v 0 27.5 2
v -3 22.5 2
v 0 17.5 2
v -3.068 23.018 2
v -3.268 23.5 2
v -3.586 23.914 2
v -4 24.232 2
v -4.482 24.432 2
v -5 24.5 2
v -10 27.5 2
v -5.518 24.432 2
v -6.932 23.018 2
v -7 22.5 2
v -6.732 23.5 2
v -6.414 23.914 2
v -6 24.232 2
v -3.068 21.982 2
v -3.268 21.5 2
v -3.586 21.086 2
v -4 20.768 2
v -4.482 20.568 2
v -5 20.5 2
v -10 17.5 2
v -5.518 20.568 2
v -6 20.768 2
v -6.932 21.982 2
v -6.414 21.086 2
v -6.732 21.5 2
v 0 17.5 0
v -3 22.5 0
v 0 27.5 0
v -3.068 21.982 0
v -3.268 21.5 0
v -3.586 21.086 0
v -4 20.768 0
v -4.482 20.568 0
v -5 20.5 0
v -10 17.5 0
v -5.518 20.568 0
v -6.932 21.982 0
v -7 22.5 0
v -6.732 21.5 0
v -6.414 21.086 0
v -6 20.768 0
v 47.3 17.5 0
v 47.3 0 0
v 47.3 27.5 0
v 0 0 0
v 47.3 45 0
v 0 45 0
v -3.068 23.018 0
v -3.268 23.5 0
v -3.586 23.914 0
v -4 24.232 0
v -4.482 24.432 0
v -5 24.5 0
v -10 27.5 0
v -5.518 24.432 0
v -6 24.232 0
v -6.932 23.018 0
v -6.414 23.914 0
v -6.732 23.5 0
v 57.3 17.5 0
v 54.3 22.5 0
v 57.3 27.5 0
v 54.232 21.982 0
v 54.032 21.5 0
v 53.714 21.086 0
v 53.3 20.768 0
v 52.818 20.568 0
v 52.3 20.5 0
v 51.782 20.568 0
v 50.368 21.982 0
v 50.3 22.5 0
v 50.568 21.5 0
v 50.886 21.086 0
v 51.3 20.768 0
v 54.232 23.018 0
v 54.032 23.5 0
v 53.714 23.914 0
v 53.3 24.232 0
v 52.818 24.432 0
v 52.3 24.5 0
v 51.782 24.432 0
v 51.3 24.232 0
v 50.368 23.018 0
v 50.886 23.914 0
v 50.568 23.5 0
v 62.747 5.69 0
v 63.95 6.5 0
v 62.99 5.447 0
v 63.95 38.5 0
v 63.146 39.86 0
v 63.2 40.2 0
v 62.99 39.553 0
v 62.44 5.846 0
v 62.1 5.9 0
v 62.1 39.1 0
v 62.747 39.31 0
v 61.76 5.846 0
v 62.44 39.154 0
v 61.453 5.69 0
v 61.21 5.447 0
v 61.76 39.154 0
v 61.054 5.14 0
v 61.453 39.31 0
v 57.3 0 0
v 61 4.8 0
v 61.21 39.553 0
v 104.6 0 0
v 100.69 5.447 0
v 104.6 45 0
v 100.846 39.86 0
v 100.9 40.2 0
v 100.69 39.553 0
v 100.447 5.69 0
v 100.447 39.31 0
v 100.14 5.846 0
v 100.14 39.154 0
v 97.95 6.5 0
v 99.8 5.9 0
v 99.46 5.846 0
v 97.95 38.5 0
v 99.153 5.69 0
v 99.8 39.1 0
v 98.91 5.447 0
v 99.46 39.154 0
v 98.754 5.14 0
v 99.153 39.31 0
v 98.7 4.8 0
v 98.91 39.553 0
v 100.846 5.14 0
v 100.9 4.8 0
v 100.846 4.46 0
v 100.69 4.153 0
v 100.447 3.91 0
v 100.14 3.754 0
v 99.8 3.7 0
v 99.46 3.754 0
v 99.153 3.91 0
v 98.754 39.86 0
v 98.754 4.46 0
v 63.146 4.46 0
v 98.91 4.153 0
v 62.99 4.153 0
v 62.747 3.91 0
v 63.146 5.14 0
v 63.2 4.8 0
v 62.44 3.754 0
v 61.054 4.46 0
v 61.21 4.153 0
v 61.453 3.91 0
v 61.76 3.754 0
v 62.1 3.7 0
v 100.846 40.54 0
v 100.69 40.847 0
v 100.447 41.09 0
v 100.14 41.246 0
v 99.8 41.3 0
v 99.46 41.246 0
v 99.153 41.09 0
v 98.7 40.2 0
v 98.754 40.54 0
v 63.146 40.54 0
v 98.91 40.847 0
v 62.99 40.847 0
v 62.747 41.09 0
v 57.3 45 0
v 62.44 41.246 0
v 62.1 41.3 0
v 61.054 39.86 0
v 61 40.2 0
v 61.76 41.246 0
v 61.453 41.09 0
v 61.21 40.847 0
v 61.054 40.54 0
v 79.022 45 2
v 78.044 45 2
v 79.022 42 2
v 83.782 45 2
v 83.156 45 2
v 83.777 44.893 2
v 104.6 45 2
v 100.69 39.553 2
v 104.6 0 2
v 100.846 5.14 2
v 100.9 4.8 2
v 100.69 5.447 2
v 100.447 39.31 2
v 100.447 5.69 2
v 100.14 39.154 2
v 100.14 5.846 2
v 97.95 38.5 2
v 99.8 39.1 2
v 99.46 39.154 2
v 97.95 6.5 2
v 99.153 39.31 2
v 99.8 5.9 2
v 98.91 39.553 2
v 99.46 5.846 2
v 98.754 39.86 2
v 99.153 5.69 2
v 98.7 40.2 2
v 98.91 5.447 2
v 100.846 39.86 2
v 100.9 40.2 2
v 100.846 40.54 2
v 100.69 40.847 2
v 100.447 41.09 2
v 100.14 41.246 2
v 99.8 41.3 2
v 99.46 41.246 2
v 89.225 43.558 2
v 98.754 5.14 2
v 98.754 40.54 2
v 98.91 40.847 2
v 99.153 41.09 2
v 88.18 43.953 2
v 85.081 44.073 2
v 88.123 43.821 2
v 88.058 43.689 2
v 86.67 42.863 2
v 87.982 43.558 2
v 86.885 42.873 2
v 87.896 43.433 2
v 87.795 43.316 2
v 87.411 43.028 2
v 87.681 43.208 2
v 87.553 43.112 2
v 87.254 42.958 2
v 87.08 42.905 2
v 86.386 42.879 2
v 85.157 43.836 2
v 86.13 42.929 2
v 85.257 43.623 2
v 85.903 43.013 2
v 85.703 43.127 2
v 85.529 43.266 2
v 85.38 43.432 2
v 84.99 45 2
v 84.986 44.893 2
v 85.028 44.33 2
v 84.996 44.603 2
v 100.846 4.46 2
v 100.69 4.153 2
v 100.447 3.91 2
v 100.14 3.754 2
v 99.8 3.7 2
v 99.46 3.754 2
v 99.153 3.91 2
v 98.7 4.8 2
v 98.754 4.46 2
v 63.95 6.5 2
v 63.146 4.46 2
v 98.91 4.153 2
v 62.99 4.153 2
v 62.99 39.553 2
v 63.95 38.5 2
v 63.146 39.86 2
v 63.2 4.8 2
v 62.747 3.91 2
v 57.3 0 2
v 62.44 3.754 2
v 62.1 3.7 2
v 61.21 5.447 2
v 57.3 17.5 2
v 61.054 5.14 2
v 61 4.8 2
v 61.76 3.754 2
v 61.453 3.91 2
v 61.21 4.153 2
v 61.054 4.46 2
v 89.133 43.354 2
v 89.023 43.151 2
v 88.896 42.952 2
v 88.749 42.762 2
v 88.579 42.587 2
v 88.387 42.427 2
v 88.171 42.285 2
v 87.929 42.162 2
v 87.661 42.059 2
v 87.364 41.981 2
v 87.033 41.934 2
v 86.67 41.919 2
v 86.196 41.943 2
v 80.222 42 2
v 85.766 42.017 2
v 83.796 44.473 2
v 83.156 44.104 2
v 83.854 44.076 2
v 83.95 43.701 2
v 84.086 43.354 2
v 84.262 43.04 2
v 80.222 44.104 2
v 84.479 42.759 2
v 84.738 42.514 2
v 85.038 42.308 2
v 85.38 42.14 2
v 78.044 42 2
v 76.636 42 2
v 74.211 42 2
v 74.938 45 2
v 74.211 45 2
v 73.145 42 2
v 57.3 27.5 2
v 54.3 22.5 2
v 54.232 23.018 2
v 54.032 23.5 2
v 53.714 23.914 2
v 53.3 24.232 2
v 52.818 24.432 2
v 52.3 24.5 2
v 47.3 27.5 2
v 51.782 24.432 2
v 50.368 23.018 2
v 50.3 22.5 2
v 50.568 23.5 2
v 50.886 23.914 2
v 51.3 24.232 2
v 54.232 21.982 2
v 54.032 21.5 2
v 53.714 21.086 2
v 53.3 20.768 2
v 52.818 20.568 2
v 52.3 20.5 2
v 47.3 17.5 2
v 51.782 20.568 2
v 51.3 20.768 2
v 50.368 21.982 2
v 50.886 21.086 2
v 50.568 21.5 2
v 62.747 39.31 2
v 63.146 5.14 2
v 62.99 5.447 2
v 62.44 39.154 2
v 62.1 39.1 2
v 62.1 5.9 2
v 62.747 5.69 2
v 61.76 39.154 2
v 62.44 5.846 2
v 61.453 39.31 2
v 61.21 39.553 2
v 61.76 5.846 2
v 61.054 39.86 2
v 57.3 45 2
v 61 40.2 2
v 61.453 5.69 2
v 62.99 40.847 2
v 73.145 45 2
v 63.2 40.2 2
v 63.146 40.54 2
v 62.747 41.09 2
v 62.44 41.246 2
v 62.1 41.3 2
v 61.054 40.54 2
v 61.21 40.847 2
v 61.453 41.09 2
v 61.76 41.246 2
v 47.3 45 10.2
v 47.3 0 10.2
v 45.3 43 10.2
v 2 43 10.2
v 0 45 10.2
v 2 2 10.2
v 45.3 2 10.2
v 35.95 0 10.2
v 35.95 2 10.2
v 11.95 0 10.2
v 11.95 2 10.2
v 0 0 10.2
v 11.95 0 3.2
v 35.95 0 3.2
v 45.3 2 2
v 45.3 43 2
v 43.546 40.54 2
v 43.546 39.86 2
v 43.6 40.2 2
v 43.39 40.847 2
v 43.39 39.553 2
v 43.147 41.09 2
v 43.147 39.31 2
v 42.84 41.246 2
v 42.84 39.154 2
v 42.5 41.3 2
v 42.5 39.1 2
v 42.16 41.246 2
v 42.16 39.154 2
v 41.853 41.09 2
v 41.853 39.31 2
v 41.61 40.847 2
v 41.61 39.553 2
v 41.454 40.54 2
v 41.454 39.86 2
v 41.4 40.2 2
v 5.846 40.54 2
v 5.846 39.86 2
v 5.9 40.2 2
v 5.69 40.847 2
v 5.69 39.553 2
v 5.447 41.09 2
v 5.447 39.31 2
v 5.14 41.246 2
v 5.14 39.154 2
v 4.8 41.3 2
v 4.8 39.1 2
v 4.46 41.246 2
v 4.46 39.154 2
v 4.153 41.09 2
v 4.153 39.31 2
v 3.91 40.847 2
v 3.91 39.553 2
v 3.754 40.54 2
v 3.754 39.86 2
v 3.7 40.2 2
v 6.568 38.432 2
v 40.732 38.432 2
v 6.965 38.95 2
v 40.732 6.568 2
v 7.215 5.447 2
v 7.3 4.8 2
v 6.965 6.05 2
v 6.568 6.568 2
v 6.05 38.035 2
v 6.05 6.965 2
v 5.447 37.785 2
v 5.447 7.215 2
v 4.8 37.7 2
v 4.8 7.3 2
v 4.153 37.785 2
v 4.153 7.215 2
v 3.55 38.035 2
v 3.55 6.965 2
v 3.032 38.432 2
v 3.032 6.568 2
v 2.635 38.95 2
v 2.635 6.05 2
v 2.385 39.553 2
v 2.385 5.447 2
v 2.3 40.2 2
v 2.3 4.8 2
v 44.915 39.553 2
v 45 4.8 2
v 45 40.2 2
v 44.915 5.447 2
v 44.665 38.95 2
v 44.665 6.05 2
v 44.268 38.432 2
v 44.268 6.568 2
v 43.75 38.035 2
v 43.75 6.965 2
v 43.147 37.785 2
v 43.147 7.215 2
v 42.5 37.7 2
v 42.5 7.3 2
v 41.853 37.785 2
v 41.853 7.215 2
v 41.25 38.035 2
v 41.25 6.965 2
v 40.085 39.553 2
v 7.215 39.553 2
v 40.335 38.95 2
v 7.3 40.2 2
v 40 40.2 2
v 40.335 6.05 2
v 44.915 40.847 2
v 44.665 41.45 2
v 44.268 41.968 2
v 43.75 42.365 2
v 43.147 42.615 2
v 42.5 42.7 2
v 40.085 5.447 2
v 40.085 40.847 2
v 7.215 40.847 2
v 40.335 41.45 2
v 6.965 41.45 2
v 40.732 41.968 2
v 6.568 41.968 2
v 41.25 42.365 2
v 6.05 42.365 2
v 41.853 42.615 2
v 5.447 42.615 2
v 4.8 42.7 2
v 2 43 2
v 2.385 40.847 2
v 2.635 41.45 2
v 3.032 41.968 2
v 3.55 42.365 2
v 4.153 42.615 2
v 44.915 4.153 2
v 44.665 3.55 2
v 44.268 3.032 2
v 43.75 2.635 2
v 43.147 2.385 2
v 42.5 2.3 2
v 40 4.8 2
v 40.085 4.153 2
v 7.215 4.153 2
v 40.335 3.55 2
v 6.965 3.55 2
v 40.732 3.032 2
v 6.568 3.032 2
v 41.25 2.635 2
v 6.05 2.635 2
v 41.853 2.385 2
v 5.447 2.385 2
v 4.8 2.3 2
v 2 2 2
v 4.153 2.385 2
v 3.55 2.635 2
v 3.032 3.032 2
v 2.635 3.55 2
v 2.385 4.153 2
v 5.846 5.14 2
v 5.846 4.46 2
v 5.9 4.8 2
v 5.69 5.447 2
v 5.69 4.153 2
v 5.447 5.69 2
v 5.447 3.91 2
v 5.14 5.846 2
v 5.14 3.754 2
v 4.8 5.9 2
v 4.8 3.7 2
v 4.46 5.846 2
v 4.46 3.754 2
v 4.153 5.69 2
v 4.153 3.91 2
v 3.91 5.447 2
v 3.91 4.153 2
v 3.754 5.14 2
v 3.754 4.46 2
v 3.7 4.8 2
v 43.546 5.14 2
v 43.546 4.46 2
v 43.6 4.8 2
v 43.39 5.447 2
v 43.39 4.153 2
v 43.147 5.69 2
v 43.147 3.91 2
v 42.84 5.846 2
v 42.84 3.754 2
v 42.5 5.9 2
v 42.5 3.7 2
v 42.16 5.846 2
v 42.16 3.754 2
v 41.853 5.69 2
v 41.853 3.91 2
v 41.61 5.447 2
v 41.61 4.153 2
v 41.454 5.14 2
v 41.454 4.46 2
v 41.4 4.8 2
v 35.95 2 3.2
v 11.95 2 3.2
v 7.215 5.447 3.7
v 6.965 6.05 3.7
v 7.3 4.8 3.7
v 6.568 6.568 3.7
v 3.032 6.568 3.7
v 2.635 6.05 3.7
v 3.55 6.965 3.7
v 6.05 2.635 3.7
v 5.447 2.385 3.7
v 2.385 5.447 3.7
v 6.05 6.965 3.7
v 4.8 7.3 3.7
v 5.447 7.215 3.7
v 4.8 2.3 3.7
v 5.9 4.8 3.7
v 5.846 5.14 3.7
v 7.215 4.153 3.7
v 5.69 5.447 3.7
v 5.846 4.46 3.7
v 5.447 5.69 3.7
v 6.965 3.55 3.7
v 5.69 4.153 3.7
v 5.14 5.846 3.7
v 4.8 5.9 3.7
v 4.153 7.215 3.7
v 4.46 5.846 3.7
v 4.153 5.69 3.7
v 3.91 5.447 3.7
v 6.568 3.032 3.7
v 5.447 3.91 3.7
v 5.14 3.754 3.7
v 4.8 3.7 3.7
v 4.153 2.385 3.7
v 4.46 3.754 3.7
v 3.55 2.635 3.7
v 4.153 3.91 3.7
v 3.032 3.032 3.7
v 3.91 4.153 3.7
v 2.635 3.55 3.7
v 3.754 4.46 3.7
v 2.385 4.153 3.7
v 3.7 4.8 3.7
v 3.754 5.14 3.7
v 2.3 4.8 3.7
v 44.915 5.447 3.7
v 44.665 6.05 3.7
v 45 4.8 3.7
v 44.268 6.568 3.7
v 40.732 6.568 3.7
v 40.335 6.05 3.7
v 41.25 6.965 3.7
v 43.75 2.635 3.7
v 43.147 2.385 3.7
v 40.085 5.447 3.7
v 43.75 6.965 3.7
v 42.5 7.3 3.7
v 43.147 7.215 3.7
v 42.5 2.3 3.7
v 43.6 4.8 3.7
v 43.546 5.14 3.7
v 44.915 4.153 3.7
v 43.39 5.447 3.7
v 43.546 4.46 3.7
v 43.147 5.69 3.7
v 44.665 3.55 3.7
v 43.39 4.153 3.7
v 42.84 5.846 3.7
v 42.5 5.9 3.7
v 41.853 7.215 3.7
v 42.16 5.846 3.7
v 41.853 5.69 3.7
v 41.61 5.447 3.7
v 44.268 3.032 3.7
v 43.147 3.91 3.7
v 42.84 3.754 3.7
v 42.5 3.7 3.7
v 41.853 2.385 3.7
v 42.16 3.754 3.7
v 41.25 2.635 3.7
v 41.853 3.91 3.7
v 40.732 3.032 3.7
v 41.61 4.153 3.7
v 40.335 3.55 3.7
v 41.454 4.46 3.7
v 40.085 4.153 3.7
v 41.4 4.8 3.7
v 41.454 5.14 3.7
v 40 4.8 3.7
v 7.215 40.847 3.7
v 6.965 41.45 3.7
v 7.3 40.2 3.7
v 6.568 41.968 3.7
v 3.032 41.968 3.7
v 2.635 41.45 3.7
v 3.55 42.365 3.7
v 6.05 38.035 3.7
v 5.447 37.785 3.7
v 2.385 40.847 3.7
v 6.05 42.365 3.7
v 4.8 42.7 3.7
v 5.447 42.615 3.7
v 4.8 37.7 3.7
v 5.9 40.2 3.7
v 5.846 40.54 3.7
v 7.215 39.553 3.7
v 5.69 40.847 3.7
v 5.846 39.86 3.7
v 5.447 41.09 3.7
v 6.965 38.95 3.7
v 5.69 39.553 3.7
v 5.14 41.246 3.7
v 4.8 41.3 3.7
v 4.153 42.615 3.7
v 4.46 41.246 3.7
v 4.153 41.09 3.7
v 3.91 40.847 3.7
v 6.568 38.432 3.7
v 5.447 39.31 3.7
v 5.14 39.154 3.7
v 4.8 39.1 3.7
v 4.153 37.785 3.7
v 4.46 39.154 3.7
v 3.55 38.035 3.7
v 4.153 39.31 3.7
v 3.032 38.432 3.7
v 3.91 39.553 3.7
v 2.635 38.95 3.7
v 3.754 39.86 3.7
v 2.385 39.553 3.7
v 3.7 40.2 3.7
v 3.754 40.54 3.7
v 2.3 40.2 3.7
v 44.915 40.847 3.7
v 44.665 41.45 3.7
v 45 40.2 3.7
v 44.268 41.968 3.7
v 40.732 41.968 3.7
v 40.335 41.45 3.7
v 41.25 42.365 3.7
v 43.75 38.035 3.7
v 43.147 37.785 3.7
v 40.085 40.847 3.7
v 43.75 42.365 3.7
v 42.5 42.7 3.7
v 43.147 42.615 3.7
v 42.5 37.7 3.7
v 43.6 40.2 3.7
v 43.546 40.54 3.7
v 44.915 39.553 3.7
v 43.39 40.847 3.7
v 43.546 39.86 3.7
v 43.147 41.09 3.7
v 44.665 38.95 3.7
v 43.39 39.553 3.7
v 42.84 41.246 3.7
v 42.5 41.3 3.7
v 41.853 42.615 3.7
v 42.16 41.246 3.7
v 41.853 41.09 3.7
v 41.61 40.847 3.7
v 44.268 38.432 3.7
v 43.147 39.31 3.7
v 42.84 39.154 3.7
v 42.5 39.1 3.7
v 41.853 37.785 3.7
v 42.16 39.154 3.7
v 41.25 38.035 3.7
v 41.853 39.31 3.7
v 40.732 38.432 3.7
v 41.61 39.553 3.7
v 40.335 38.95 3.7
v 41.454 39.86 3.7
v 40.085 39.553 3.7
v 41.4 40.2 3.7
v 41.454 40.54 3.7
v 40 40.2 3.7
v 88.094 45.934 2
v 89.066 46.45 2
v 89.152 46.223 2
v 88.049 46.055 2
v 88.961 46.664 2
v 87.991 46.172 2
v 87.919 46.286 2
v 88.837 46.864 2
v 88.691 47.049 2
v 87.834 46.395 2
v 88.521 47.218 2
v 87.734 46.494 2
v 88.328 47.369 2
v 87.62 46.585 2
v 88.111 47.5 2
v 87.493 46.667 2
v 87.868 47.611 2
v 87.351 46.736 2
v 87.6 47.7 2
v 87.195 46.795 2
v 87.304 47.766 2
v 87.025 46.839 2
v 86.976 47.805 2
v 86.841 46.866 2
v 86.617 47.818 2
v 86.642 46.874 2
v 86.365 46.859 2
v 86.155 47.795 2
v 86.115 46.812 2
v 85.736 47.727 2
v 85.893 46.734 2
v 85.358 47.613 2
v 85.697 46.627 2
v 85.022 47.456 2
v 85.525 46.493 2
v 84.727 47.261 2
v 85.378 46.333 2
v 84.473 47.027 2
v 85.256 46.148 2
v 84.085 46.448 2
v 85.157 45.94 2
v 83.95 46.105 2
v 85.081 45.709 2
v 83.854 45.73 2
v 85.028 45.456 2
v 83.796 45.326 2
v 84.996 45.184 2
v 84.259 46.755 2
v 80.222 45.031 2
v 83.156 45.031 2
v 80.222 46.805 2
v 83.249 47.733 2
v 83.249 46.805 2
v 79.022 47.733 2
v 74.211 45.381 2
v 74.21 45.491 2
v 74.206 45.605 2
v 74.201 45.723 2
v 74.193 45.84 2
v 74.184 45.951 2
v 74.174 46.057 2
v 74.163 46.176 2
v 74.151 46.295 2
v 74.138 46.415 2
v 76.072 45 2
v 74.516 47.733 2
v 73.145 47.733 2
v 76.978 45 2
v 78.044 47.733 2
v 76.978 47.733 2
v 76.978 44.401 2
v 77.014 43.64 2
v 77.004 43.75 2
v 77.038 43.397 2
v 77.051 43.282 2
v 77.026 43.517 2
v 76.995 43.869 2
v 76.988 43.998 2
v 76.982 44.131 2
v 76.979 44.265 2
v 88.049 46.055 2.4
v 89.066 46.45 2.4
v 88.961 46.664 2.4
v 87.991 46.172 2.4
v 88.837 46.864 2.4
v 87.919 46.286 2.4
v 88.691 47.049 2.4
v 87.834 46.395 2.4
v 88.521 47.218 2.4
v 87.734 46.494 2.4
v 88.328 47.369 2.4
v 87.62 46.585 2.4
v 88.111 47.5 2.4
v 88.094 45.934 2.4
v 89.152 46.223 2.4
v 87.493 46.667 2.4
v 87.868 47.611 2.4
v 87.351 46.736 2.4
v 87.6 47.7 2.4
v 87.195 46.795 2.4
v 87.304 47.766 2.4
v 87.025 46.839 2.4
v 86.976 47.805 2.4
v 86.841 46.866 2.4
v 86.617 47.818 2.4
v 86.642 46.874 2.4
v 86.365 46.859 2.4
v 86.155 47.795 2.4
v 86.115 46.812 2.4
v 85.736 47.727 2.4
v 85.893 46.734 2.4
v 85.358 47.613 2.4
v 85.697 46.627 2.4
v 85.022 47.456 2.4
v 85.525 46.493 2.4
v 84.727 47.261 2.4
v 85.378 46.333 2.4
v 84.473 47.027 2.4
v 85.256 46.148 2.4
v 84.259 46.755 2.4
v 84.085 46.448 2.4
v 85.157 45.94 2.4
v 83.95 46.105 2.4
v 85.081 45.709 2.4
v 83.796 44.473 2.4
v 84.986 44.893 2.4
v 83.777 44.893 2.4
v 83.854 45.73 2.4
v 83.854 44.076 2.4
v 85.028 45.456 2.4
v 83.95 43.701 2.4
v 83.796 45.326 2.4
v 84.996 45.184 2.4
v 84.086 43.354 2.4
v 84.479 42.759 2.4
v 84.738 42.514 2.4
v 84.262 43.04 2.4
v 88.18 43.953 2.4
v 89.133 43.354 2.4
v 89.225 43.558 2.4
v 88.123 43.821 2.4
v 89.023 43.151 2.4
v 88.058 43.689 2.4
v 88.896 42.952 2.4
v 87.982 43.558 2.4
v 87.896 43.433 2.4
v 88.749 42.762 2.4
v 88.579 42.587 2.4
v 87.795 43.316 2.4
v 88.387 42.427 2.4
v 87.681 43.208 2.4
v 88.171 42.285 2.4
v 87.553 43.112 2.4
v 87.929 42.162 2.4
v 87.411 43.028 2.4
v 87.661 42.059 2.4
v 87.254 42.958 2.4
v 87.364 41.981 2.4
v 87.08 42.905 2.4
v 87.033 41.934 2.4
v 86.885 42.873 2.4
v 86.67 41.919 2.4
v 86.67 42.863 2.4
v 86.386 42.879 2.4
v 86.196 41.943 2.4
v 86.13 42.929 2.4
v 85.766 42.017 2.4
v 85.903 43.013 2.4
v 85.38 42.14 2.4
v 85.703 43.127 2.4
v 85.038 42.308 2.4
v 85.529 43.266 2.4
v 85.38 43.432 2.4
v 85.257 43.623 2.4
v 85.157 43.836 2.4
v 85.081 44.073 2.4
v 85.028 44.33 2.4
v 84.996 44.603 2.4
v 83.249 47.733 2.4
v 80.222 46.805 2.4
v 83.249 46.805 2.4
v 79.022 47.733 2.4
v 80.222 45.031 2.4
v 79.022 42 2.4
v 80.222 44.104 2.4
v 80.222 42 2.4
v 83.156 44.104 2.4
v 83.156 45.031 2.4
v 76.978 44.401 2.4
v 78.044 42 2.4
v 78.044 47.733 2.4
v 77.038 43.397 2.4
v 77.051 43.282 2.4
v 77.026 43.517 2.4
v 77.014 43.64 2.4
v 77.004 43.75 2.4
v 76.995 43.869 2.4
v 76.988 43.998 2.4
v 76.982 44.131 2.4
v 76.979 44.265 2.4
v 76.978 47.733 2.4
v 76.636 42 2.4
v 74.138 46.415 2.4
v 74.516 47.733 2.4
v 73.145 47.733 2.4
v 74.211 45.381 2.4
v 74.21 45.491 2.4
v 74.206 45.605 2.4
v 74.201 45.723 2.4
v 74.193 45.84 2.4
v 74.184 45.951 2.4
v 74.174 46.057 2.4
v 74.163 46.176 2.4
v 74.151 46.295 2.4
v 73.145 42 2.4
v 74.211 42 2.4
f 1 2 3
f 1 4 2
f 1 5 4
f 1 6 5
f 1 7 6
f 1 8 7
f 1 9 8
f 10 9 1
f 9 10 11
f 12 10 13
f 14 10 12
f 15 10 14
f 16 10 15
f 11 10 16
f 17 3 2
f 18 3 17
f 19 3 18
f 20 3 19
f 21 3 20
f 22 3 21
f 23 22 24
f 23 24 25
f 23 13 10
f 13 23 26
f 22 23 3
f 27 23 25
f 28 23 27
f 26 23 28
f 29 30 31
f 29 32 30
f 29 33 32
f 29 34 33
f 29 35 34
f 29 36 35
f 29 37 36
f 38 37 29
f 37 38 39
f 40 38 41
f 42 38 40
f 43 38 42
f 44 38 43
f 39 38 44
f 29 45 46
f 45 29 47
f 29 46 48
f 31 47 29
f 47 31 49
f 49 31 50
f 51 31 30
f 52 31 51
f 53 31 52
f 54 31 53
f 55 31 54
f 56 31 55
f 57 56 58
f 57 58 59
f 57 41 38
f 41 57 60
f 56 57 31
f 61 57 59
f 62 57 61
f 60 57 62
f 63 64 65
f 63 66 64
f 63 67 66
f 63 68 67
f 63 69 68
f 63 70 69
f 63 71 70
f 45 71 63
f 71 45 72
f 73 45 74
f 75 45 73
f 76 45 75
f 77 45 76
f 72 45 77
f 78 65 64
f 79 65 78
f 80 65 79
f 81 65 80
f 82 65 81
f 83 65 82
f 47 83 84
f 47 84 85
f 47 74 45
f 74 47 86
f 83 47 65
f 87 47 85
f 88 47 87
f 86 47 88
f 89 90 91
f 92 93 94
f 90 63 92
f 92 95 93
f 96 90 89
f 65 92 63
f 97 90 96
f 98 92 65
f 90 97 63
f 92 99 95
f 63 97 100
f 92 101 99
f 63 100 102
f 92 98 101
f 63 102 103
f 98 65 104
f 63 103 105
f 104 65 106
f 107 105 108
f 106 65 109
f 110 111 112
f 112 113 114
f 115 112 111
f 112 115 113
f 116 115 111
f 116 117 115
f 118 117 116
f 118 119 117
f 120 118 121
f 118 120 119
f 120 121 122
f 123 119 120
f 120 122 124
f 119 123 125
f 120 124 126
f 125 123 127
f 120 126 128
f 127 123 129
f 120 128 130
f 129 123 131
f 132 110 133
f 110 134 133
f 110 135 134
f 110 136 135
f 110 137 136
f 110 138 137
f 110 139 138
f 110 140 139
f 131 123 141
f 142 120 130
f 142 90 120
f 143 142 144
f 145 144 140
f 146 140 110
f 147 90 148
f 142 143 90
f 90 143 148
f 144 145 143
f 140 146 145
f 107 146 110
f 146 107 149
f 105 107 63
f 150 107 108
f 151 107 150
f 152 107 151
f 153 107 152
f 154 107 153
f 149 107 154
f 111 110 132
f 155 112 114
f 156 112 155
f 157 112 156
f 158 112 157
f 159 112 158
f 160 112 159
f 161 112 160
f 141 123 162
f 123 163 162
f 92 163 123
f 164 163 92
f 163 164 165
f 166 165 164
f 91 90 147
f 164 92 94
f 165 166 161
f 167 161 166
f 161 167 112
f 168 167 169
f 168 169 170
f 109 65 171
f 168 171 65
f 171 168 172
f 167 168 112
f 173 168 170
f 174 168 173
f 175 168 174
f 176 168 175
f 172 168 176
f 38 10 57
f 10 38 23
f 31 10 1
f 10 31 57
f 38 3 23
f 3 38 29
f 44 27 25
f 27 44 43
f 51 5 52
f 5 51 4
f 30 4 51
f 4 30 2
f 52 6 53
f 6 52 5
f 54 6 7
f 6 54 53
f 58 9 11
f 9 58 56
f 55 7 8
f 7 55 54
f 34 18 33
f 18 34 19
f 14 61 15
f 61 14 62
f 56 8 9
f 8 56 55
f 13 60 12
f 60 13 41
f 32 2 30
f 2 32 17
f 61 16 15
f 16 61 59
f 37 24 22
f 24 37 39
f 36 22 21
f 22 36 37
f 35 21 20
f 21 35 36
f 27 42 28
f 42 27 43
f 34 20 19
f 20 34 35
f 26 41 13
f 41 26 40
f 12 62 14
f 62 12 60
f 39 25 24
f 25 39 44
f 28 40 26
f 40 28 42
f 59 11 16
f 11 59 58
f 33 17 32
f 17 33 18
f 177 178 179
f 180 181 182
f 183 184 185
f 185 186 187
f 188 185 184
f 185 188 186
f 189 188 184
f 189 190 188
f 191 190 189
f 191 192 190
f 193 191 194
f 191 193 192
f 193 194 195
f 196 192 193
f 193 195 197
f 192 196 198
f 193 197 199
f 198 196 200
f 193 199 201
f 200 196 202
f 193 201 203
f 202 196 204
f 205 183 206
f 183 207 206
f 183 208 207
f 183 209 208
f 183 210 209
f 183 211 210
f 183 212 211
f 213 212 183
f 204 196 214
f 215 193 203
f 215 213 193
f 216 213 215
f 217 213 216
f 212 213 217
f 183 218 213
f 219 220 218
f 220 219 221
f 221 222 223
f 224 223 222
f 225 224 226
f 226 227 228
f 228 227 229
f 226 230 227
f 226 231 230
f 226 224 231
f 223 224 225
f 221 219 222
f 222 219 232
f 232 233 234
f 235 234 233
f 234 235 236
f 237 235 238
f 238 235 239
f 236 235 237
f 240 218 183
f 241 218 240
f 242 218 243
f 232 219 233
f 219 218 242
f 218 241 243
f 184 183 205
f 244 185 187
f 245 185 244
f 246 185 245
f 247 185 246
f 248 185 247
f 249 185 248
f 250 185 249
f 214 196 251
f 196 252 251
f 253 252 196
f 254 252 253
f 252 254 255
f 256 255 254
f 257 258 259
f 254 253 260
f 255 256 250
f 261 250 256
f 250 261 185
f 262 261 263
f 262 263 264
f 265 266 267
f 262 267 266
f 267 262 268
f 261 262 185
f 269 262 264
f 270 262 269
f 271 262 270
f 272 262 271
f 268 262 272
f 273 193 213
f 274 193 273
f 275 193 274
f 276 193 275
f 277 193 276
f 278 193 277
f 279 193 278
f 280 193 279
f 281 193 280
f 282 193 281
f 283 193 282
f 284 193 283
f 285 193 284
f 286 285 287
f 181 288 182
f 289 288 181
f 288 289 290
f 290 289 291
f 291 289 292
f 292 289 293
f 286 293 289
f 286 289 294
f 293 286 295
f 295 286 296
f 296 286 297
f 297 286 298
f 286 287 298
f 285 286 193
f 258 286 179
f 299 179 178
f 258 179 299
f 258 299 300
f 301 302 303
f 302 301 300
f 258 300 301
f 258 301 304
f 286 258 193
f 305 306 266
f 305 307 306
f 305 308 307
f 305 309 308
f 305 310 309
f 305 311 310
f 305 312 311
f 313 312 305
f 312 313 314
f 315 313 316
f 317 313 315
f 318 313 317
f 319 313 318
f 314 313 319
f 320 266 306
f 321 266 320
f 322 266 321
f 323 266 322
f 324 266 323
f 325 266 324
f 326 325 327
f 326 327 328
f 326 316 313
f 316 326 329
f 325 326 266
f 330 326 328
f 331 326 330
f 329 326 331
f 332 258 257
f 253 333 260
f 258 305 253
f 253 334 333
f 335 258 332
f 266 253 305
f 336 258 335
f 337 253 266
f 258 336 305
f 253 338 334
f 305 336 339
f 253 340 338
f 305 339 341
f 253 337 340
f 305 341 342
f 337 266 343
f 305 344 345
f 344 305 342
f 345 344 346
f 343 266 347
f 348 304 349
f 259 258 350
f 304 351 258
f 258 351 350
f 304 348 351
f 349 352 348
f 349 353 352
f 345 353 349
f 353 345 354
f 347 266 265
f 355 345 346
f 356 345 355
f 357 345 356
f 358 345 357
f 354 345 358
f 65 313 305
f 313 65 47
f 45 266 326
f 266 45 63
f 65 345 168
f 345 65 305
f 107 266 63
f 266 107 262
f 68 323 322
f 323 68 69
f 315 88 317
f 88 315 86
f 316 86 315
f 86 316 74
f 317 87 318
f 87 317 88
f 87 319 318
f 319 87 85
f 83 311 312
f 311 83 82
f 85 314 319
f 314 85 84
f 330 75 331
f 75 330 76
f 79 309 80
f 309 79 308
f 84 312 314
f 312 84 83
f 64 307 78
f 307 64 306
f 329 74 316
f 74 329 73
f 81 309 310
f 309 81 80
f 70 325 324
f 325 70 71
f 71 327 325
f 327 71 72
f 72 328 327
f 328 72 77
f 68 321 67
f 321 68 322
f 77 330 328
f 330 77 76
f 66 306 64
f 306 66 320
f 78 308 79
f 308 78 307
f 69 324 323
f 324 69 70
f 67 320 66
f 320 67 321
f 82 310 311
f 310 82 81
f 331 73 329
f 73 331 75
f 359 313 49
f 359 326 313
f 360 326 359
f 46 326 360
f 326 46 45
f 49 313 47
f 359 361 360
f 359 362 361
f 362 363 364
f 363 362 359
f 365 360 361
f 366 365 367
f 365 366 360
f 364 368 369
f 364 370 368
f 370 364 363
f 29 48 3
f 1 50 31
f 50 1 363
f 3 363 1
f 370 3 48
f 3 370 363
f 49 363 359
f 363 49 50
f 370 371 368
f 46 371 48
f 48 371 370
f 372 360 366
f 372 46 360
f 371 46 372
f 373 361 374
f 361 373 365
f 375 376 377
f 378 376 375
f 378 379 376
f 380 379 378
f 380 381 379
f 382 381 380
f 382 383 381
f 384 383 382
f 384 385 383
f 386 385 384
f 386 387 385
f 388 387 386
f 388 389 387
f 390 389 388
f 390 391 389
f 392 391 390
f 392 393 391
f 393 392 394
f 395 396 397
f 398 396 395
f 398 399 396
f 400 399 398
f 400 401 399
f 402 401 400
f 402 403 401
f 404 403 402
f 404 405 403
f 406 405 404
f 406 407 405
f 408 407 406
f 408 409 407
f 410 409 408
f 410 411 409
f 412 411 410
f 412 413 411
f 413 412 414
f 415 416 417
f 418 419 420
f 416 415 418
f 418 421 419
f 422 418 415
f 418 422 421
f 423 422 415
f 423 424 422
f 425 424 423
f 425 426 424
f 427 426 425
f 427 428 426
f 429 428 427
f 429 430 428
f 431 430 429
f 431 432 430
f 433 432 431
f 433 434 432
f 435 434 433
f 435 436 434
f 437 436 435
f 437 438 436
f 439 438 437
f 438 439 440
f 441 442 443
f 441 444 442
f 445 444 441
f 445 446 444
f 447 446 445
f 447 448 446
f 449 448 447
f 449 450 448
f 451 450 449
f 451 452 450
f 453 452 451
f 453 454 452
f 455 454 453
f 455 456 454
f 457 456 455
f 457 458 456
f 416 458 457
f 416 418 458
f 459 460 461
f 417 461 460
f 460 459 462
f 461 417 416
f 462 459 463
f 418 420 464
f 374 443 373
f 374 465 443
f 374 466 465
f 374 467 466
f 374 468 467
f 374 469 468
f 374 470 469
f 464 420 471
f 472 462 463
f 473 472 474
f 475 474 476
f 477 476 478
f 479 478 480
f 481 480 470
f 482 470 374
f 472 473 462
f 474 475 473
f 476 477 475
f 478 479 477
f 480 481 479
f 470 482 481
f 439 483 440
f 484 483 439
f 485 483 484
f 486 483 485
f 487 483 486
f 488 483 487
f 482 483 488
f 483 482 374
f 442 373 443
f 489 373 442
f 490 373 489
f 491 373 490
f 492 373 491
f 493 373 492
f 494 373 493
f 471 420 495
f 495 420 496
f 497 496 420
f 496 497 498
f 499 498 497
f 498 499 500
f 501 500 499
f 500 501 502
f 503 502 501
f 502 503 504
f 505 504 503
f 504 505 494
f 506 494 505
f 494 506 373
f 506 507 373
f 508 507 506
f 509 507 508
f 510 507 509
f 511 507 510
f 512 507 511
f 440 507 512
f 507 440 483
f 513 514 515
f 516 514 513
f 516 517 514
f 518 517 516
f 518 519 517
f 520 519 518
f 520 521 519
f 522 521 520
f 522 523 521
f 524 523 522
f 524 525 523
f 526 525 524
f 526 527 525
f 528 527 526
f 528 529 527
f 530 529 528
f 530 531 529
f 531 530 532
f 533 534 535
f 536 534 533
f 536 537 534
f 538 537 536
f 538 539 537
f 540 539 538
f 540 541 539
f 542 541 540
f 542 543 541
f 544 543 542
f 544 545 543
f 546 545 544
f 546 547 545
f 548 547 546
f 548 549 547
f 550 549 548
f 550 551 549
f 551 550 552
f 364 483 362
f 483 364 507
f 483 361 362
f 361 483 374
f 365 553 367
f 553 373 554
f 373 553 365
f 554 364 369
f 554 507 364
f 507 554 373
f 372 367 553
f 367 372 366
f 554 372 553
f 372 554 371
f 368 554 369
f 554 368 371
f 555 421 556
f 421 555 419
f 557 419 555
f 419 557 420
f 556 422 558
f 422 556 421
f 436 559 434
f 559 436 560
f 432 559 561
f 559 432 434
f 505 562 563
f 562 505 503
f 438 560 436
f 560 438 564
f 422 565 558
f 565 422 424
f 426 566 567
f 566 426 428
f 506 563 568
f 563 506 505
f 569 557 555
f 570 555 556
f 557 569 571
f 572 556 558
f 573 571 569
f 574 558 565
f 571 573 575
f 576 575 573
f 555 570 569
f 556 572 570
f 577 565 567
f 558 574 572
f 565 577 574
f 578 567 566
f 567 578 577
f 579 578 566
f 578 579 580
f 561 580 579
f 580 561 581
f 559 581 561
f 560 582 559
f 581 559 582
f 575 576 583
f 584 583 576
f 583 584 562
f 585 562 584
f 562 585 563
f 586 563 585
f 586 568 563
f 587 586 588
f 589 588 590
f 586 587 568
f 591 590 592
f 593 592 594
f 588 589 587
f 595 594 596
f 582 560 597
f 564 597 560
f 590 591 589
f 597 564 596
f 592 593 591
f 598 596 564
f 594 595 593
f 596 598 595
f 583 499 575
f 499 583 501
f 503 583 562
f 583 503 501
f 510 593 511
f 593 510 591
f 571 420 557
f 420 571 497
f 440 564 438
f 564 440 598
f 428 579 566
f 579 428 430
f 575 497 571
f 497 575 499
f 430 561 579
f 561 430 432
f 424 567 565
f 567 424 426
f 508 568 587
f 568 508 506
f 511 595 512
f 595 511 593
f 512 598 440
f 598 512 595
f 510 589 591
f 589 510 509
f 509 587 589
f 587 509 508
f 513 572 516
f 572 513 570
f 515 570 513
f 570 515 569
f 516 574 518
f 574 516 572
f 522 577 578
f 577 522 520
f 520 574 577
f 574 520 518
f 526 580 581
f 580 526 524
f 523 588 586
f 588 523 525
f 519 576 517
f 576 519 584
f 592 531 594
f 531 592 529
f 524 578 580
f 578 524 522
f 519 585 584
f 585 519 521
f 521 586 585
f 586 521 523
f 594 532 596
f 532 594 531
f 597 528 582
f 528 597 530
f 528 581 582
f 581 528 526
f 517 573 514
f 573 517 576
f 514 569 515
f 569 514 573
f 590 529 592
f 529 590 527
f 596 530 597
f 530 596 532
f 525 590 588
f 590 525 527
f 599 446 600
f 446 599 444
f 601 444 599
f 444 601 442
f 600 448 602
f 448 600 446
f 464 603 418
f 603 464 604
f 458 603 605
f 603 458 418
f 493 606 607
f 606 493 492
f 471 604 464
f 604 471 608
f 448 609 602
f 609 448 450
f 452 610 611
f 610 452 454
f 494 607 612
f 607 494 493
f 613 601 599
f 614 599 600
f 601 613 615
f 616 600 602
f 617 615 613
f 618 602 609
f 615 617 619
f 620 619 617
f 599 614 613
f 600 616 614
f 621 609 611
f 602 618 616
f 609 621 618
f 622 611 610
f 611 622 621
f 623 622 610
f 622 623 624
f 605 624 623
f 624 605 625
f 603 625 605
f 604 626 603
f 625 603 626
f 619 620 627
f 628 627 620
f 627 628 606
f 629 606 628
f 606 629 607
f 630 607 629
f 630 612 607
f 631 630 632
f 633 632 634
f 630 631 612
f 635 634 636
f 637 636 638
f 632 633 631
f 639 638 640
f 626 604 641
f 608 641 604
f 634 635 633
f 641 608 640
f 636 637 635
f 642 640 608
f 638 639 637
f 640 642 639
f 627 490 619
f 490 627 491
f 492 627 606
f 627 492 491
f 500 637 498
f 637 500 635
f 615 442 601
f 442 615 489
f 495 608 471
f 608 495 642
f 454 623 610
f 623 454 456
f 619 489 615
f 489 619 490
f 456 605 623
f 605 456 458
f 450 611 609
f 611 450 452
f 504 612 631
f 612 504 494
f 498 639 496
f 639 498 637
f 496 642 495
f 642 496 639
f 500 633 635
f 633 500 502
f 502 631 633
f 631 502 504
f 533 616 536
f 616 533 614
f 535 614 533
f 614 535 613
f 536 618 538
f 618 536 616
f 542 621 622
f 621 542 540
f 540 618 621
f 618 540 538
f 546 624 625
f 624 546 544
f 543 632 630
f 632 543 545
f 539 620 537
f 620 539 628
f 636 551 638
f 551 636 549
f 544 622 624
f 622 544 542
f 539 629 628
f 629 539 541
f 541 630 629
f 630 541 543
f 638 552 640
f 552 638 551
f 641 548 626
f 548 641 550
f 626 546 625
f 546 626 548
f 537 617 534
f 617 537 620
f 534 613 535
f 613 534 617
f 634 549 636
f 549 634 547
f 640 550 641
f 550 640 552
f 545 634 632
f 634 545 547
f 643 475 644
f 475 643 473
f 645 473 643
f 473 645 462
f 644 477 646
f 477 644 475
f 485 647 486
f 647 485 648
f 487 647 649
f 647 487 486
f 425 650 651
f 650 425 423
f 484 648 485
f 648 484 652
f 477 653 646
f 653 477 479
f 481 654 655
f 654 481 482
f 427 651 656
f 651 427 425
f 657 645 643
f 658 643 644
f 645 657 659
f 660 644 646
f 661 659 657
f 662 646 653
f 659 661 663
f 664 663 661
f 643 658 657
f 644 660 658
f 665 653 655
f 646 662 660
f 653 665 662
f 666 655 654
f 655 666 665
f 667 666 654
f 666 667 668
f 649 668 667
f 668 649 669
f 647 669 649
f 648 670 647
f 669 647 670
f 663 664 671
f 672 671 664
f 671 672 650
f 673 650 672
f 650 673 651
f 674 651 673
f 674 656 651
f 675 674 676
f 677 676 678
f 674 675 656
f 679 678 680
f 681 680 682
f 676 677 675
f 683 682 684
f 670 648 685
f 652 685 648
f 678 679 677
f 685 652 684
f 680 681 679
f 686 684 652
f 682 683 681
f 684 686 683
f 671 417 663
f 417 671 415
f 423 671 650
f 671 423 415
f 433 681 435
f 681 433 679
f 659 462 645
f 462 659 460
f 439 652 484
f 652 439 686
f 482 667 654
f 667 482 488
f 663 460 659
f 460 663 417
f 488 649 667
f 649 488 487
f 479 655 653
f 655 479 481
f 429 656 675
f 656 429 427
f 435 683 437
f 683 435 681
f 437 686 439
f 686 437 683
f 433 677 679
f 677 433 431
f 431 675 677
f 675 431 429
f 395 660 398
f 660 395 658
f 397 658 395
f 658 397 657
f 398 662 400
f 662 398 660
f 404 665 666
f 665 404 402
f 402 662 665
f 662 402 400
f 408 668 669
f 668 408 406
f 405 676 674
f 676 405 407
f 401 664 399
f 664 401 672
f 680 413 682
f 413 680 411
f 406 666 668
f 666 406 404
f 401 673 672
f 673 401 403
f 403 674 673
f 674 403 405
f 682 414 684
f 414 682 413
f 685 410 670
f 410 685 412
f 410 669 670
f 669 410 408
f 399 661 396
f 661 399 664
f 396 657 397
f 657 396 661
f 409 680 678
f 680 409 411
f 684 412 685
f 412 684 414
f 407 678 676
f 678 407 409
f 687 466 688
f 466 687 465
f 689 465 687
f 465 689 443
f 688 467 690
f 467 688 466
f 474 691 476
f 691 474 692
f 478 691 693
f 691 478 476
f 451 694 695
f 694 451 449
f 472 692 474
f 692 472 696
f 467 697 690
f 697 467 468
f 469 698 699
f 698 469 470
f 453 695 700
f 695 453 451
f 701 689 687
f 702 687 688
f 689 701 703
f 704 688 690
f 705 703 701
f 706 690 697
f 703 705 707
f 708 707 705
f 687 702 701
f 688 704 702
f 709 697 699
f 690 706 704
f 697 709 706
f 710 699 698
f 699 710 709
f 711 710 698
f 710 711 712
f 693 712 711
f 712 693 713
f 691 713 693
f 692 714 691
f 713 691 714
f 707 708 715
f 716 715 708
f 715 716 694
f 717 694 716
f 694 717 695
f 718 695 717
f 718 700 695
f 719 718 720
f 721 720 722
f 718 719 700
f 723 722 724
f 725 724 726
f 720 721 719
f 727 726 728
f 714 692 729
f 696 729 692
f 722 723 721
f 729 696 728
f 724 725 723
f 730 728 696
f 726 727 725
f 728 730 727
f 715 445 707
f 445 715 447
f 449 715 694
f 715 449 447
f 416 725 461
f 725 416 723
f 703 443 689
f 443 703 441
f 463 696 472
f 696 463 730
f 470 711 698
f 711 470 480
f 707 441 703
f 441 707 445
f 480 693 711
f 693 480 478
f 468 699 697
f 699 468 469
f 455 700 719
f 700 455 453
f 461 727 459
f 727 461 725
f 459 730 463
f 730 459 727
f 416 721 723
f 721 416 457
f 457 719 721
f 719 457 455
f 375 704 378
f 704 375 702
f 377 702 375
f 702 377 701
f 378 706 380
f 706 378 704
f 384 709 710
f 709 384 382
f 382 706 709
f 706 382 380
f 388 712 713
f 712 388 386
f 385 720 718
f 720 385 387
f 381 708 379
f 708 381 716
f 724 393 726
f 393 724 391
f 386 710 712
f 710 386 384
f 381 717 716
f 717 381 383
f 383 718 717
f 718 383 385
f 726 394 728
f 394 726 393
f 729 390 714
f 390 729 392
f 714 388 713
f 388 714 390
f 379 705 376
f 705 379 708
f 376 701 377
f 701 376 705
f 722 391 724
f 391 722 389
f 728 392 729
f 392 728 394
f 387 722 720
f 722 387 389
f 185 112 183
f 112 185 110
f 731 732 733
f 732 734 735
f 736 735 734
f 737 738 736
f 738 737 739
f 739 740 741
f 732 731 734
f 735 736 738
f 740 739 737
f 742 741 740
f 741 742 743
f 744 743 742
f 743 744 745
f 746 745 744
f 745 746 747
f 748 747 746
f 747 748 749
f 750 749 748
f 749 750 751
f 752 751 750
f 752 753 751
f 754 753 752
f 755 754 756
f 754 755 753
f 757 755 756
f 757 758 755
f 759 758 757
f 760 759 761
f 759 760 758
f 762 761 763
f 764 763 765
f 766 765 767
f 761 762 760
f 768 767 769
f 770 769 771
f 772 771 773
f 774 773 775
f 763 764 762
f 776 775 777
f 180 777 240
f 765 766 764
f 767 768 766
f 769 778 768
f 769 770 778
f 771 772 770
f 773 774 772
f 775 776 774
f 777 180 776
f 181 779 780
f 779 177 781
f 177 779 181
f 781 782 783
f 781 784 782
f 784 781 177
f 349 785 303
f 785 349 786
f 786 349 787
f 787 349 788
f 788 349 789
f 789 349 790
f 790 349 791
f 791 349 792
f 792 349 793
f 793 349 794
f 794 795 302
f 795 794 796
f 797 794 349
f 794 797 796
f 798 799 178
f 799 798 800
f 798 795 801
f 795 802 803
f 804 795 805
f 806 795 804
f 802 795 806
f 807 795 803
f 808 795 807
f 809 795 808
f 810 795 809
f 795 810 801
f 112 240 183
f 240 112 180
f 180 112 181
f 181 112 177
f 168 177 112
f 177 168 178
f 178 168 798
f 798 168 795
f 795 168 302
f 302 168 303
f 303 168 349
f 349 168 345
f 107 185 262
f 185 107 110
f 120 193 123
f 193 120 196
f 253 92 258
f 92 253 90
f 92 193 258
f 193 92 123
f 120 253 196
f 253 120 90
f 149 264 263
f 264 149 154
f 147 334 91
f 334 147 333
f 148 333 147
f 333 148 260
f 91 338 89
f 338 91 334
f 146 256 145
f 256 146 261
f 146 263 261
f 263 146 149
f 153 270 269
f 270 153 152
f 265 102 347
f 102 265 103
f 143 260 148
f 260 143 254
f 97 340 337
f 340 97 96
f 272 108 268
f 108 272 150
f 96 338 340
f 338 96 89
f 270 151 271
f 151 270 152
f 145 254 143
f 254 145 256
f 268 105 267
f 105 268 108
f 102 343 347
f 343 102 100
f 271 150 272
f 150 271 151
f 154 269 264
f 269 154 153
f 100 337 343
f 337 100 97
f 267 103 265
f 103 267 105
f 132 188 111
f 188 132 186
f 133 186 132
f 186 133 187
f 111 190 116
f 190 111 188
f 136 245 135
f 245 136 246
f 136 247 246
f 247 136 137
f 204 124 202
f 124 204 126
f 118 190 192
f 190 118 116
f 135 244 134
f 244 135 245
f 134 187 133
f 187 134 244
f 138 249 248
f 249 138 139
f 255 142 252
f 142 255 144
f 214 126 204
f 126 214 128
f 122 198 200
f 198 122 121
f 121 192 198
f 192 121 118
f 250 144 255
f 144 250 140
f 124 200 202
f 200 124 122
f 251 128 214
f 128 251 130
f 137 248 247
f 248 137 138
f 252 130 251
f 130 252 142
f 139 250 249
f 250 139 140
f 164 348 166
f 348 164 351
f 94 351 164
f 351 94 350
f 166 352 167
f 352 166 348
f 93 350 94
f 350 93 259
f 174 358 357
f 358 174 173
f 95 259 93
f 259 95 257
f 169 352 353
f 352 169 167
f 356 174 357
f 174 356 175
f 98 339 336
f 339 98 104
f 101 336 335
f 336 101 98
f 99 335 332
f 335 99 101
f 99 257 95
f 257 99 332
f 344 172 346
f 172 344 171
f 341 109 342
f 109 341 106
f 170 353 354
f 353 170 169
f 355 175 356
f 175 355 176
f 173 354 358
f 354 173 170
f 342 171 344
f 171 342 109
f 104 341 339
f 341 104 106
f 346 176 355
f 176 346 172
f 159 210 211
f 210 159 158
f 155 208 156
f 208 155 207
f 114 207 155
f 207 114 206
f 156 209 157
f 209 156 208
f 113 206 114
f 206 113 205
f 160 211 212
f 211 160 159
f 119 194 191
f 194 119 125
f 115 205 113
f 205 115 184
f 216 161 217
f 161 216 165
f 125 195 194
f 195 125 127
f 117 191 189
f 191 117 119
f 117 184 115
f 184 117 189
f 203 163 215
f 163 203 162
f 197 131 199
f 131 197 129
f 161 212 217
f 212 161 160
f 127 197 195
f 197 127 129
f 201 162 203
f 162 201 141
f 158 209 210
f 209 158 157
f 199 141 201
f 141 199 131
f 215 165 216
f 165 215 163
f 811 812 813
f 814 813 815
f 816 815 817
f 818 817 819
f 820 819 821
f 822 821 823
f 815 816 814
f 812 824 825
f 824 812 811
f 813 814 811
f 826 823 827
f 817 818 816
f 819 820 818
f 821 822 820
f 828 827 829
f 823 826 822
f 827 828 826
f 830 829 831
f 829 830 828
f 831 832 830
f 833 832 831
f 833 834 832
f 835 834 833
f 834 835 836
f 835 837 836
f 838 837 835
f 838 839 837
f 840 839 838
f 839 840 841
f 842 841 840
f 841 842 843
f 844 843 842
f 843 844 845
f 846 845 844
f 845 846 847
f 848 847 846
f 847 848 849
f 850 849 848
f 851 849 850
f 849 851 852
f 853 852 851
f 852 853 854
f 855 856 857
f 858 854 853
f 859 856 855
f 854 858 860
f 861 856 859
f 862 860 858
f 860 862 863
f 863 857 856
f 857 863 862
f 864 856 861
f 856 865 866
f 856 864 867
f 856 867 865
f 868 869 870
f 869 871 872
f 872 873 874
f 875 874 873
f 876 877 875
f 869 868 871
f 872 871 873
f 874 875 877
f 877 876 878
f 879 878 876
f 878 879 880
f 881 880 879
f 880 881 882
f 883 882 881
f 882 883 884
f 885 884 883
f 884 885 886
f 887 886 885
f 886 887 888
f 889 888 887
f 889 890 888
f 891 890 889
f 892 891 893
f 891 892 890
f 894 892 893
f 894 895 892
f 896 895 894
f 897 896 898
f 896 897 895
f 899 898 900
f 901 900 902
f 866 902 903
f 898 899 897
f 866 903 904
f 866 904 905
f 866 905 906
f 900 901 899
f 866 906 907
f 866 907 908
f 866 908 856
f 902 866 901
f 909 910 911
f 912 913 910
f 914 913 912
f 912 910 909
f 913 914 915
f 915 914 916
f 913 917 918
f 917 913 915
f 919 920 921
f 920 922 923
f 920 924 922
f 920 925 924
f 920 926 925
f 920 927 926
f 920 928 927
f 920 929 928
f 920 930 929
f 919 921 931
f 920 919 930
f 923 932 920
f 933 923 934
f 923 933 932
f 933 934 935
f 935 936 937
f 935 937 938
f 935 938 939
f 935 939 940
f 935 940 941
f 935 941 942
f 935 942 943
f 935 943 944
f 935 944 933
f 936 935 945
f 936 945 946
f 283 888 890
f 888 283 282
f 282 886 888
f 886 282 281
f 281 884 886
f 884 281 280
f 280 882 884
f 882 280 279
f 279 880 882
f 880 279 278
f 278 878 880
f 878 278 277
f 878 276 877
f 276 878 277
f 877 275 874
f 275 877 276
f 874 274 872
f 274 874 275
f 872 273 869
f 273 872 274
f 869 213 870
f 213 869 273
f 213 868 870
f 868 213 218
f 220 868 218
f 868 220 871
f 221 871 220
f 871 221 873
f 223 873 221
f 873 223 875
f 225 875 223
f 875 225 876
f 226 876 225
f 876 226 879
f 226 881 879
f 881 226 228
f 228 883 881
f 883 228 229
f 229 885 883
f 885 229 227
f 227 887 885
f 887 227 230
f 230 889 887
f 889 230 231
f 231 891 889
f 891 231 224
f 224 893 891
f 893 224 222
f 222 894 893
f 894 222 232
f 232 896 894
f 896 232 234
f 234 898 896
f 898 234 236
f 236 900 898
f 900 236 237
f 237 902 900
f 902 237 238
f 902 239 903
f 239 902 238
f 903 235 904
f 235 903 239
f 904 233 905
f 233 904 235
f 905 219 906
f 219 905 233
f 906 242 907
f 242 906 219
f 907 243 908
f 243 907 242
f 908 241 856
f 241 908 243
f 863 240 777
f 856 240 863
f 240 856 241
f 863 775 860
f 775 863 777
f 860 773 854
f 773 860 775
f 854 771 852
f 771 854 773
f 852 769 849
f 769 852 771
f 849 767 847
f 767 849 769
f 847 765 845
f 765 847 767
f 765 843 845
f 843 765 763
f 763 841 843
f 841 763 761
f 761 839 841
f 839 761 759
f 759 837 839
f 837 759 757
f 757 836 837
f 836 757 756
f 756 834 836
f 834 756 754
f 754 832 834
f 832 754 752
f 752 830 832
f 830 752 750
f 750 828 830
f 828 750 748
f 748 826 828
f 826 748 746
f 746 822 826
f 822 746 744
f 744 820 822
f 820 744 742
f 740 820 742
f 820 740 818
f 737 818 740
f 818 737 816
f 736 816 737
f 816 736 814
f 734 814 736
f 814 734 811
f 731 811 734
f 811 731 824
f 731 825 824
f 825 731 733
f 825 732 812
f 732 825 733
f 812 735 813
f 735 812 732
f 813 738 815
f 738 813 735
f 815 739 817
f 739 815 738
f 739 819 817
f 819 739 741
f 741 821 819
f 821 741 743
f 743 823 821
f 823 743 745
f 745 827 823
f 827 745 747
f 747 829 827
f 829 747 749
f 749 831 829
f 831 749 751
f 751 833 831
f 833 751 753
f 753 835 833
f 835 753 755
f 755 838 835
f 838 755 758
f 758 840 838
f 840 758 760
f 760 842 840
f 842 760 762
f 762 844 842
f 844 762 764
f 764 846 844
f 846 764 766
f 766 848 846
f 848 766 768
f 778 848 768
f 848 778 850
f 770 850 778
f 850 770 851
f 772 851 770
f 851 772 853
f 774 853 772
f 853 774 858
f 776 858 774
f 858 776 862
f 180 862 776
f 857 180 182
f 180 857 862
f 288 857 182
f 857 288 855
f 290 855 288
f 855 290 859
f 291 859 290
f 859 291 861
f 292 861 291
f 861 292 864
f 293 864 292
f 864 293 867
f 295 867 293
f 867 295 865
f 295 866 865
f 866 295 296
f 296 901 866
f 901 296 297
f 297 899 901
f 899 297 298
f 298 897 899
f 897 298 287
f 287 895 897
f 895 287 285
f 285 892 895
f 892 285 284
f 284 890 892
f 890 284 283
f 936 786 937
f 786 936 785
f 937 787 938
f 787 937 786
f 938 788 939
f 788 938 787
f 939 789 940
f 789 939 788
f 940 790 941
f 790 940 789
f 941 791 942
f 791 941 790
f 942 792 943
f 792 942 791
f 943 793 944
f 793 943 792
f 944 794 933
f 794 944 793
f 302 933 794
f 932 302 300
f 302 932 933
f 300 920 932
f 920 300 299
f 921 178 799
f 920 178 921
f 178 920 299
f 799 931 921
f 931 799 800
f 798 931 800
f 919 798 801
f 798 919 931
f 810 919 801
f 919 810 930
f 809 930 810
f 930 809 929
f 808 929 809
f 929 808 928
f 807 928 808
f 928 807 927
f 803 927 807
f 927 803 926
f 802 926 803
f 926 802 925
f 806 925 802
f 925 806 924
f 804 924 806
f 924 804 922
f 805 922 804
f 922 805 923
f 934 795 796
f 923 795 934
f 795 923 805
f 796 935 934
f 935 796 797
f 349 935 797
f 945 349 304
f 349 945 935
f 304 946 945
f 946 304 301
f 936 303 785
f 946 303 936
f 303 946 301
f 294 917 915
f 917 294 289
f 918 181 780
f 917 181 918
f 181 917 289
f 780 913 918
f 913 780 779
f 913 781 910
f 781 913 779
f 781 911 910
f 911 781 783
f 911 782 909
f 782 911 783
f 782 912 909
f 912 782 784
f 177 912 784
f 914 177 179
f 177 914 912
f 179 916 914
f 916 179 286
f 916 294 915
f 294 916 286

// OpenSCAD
// Elechouse NFC Module V3 (PN532) Mount for Swiity Vending Machine
// Snap-fit / screw-mount case for the PN532 NFC reader
//
// PN532 V3 dimensions (from elechouse.com):
//   PCB: 42.7 x 40.4 x 4.0 mm (including components)
//   Mounting holes: 4x at corners, ~2.0 mm diameter
//   Mounting hole inset: ~2.5 mm from edges
//   Pin header: 8-pin, 2.54 mm pitch, along one short edge
//   Antenna: integrated, on the front face of the PCB

// --- Parameters ---

// PCB dimensions
pcb_w      = 42.7;   // width
pcb_d      = 40.4;   // depth
pcb_thick  = 4.0;    // component height (top side)
pcb_bot    = 1.2;    // component height (bottom side / solder joints)

// Mounting holes on the PCB
pcb_hole_d     = 2.0;
pcb_hole_inset = 2.5;  // from PCB edges to hole center

// Mount config
wall        = 2.0;
tolerance   = 0.3;
base_thick  = 2.0;
lip_height  = 2.5;   // lip to hold the PCB from the sides
post_h      = pcb_bot + 0.5; // standoff height to lift PCB off base
screw_d     = 2.2;   // M2 screw hole in standoffs
screw_head  = 4.0;   // M2 screw head clearance

// Faceplate window: the NFC antenna area should be unobstructed
// The antenna occupies roughly the center of the PCB
antenna_w   = 34.0;
antenna_d   = 32.0;

// Bracket mounting holes (to mount the whole thing to the vending machine)
bracket_hole_d = 4.0;  // M3 clearance
bracket_ear_w  = 10.0;
bracket_ear_h  = base_thick;

// Derived
inner_w = pcb_w + tolerance * 2;
inner_d = pcb_d + tolerance * 2;
outer_w = inner_w + wall * 2;
outer_d = inner_d + wall * 2;
total_h = base_thick + post_h + pcb_thick + lip_height;

// --- Modules ---

module standoff(x, y) {
    translate([wall + tolerance + x, wall + tolerance + y, base_thick]) {
        difference() {
            cylinder(h = post_h, d = 5.0, $fn = 24);
            translate([0, 0, -0.1])
                cylinder(h = post_h + 0.2, d = screw_d, $fn = 20);
        }
    }
}

module pcb_screw_positions() {
    // 4 corners of the PCB
    offsets = [
        [pcb_hole_inset, pcb_hole_inset],
        [pcb_w - pcb_hole_inset, pcb_hole_inset],
        [pcb_hole_inset, pcb_d - pcb_hole_inset],
        [pcb_w - pcb_hole_inset, pcb_d - pcb_hole_inset],
    ];
    for (p = offsets) children(p[0], p[1]);
}

module bracket_ears() {
    // Two ears on the sides for mounting to the machine
    for (side = [0, 1]) {
        mirror([side, 0, 0])
        translate([-bracket_ear_w, outer_d / 2 - bracket_ear_w / 2, 0]) {
            difference() {
                cube([bracket_ear_w, bracket_ear_w, bracket_ear_h]);
                translate([bracket_ear_w / 2, bracket_ear_w / 2, -0.1])
                    cylinder(h = bracket_ear_h + 0.2, d = bracket_hole_d, $fn = 24);
            }
        }
    }
}

// --- Base / tray ---
module base() {
    difference() {
        union() {
            // Main box
            cube([outer_w, outer_d, total_h]);

            // Mounting ears
            translate([0, 0, 0]) bracket_ears();
            translate([outer_w, 0, 0]) bracket_ears();
        }

        // Hollow out the inside (above the base plate)
        translate([wall, wall, base_thick])
            cube([inner_w, inner_d, total_h]);

        // Pin header cutout on one side
        translate([wall + tolerance + inner_w/2 - 12, -0.1, base_thick + post_h - 0.5])
            cube([24, wall + 0.2, pcb_thick + lip_height + 1]);
    }

    // Standoffs at PCB mounting hole positions
    pcb_screw_positions() standoff($children > 0 ? 0 : 0, 0);

    // Manual standoffs since children() trick doesn't work easily in OpenSCAD
    standoff(pcb_hole_inset, pcb_hole_inset);
    standoff(pcb_w - pcb_hole_inset, pcb_hole_inset);
    standoff(pcb_hole_inset, pcb_d - pcb_hole_inset);
    standoff(pcb_w - pcb_hole_inset, pcb_d - pcb_hole_inset);
}

// --- Faceplate (optional snap-on lid) ---
module faceplate() {
    difference() {
        // Outer plate
        cube([outer_w, outer_d, 2.0]);

        // Antenna window
        translate([outer_w/2 - antenna_w/2, outer_d/2 - antenna_d/2, -0.1])
            cube([antenna_w, antenna_d, 2.2]);

        // Screw holes to match PCB standoffs
        translate([wall + tolerance + pcb_hole_inset, wall + tolerance + pcb_hole_inset, -0.1])
            cylinder(h = 2.2, d = screw_d, $fn = 20);
        translate([wall + tolerance + pcb_w - pcb_hole_inset, wall + tolerance + pcb_hole_inset, -0.1])
            cylinder(h = 2.2, d = screw_d, $fn = 20);
        translate([wall + tolerance + pcb_hole_inset, wall + tolerance + pcb_d - pcb_hole_inset, -0.1])
            cylinder(h = 2.2, d = screw_d, $fn = 20);
        translate([wall + tolerance + pcb_w - pcb_hole_inset, wall + tolerance + pcb_d - pcb_hole_inset, -0.1])
            cylinder(h = 2.2, d = screw_d, $fn = 20);
    }

    // Label
    translate([outer_w/2, outer_d - 3, 2.0])
        linear_extrude(0.4)
            text("NFC", size = 6, halign = "center", font = "Liberation Sans:style=Bold");
}

// --- Render ---
// Uncomment one at a time for export:

// Base tray
base();

// Faceplate (shifted to the side for preview)
translate([outer_w + 10, 0, 0])
    faceplate();
